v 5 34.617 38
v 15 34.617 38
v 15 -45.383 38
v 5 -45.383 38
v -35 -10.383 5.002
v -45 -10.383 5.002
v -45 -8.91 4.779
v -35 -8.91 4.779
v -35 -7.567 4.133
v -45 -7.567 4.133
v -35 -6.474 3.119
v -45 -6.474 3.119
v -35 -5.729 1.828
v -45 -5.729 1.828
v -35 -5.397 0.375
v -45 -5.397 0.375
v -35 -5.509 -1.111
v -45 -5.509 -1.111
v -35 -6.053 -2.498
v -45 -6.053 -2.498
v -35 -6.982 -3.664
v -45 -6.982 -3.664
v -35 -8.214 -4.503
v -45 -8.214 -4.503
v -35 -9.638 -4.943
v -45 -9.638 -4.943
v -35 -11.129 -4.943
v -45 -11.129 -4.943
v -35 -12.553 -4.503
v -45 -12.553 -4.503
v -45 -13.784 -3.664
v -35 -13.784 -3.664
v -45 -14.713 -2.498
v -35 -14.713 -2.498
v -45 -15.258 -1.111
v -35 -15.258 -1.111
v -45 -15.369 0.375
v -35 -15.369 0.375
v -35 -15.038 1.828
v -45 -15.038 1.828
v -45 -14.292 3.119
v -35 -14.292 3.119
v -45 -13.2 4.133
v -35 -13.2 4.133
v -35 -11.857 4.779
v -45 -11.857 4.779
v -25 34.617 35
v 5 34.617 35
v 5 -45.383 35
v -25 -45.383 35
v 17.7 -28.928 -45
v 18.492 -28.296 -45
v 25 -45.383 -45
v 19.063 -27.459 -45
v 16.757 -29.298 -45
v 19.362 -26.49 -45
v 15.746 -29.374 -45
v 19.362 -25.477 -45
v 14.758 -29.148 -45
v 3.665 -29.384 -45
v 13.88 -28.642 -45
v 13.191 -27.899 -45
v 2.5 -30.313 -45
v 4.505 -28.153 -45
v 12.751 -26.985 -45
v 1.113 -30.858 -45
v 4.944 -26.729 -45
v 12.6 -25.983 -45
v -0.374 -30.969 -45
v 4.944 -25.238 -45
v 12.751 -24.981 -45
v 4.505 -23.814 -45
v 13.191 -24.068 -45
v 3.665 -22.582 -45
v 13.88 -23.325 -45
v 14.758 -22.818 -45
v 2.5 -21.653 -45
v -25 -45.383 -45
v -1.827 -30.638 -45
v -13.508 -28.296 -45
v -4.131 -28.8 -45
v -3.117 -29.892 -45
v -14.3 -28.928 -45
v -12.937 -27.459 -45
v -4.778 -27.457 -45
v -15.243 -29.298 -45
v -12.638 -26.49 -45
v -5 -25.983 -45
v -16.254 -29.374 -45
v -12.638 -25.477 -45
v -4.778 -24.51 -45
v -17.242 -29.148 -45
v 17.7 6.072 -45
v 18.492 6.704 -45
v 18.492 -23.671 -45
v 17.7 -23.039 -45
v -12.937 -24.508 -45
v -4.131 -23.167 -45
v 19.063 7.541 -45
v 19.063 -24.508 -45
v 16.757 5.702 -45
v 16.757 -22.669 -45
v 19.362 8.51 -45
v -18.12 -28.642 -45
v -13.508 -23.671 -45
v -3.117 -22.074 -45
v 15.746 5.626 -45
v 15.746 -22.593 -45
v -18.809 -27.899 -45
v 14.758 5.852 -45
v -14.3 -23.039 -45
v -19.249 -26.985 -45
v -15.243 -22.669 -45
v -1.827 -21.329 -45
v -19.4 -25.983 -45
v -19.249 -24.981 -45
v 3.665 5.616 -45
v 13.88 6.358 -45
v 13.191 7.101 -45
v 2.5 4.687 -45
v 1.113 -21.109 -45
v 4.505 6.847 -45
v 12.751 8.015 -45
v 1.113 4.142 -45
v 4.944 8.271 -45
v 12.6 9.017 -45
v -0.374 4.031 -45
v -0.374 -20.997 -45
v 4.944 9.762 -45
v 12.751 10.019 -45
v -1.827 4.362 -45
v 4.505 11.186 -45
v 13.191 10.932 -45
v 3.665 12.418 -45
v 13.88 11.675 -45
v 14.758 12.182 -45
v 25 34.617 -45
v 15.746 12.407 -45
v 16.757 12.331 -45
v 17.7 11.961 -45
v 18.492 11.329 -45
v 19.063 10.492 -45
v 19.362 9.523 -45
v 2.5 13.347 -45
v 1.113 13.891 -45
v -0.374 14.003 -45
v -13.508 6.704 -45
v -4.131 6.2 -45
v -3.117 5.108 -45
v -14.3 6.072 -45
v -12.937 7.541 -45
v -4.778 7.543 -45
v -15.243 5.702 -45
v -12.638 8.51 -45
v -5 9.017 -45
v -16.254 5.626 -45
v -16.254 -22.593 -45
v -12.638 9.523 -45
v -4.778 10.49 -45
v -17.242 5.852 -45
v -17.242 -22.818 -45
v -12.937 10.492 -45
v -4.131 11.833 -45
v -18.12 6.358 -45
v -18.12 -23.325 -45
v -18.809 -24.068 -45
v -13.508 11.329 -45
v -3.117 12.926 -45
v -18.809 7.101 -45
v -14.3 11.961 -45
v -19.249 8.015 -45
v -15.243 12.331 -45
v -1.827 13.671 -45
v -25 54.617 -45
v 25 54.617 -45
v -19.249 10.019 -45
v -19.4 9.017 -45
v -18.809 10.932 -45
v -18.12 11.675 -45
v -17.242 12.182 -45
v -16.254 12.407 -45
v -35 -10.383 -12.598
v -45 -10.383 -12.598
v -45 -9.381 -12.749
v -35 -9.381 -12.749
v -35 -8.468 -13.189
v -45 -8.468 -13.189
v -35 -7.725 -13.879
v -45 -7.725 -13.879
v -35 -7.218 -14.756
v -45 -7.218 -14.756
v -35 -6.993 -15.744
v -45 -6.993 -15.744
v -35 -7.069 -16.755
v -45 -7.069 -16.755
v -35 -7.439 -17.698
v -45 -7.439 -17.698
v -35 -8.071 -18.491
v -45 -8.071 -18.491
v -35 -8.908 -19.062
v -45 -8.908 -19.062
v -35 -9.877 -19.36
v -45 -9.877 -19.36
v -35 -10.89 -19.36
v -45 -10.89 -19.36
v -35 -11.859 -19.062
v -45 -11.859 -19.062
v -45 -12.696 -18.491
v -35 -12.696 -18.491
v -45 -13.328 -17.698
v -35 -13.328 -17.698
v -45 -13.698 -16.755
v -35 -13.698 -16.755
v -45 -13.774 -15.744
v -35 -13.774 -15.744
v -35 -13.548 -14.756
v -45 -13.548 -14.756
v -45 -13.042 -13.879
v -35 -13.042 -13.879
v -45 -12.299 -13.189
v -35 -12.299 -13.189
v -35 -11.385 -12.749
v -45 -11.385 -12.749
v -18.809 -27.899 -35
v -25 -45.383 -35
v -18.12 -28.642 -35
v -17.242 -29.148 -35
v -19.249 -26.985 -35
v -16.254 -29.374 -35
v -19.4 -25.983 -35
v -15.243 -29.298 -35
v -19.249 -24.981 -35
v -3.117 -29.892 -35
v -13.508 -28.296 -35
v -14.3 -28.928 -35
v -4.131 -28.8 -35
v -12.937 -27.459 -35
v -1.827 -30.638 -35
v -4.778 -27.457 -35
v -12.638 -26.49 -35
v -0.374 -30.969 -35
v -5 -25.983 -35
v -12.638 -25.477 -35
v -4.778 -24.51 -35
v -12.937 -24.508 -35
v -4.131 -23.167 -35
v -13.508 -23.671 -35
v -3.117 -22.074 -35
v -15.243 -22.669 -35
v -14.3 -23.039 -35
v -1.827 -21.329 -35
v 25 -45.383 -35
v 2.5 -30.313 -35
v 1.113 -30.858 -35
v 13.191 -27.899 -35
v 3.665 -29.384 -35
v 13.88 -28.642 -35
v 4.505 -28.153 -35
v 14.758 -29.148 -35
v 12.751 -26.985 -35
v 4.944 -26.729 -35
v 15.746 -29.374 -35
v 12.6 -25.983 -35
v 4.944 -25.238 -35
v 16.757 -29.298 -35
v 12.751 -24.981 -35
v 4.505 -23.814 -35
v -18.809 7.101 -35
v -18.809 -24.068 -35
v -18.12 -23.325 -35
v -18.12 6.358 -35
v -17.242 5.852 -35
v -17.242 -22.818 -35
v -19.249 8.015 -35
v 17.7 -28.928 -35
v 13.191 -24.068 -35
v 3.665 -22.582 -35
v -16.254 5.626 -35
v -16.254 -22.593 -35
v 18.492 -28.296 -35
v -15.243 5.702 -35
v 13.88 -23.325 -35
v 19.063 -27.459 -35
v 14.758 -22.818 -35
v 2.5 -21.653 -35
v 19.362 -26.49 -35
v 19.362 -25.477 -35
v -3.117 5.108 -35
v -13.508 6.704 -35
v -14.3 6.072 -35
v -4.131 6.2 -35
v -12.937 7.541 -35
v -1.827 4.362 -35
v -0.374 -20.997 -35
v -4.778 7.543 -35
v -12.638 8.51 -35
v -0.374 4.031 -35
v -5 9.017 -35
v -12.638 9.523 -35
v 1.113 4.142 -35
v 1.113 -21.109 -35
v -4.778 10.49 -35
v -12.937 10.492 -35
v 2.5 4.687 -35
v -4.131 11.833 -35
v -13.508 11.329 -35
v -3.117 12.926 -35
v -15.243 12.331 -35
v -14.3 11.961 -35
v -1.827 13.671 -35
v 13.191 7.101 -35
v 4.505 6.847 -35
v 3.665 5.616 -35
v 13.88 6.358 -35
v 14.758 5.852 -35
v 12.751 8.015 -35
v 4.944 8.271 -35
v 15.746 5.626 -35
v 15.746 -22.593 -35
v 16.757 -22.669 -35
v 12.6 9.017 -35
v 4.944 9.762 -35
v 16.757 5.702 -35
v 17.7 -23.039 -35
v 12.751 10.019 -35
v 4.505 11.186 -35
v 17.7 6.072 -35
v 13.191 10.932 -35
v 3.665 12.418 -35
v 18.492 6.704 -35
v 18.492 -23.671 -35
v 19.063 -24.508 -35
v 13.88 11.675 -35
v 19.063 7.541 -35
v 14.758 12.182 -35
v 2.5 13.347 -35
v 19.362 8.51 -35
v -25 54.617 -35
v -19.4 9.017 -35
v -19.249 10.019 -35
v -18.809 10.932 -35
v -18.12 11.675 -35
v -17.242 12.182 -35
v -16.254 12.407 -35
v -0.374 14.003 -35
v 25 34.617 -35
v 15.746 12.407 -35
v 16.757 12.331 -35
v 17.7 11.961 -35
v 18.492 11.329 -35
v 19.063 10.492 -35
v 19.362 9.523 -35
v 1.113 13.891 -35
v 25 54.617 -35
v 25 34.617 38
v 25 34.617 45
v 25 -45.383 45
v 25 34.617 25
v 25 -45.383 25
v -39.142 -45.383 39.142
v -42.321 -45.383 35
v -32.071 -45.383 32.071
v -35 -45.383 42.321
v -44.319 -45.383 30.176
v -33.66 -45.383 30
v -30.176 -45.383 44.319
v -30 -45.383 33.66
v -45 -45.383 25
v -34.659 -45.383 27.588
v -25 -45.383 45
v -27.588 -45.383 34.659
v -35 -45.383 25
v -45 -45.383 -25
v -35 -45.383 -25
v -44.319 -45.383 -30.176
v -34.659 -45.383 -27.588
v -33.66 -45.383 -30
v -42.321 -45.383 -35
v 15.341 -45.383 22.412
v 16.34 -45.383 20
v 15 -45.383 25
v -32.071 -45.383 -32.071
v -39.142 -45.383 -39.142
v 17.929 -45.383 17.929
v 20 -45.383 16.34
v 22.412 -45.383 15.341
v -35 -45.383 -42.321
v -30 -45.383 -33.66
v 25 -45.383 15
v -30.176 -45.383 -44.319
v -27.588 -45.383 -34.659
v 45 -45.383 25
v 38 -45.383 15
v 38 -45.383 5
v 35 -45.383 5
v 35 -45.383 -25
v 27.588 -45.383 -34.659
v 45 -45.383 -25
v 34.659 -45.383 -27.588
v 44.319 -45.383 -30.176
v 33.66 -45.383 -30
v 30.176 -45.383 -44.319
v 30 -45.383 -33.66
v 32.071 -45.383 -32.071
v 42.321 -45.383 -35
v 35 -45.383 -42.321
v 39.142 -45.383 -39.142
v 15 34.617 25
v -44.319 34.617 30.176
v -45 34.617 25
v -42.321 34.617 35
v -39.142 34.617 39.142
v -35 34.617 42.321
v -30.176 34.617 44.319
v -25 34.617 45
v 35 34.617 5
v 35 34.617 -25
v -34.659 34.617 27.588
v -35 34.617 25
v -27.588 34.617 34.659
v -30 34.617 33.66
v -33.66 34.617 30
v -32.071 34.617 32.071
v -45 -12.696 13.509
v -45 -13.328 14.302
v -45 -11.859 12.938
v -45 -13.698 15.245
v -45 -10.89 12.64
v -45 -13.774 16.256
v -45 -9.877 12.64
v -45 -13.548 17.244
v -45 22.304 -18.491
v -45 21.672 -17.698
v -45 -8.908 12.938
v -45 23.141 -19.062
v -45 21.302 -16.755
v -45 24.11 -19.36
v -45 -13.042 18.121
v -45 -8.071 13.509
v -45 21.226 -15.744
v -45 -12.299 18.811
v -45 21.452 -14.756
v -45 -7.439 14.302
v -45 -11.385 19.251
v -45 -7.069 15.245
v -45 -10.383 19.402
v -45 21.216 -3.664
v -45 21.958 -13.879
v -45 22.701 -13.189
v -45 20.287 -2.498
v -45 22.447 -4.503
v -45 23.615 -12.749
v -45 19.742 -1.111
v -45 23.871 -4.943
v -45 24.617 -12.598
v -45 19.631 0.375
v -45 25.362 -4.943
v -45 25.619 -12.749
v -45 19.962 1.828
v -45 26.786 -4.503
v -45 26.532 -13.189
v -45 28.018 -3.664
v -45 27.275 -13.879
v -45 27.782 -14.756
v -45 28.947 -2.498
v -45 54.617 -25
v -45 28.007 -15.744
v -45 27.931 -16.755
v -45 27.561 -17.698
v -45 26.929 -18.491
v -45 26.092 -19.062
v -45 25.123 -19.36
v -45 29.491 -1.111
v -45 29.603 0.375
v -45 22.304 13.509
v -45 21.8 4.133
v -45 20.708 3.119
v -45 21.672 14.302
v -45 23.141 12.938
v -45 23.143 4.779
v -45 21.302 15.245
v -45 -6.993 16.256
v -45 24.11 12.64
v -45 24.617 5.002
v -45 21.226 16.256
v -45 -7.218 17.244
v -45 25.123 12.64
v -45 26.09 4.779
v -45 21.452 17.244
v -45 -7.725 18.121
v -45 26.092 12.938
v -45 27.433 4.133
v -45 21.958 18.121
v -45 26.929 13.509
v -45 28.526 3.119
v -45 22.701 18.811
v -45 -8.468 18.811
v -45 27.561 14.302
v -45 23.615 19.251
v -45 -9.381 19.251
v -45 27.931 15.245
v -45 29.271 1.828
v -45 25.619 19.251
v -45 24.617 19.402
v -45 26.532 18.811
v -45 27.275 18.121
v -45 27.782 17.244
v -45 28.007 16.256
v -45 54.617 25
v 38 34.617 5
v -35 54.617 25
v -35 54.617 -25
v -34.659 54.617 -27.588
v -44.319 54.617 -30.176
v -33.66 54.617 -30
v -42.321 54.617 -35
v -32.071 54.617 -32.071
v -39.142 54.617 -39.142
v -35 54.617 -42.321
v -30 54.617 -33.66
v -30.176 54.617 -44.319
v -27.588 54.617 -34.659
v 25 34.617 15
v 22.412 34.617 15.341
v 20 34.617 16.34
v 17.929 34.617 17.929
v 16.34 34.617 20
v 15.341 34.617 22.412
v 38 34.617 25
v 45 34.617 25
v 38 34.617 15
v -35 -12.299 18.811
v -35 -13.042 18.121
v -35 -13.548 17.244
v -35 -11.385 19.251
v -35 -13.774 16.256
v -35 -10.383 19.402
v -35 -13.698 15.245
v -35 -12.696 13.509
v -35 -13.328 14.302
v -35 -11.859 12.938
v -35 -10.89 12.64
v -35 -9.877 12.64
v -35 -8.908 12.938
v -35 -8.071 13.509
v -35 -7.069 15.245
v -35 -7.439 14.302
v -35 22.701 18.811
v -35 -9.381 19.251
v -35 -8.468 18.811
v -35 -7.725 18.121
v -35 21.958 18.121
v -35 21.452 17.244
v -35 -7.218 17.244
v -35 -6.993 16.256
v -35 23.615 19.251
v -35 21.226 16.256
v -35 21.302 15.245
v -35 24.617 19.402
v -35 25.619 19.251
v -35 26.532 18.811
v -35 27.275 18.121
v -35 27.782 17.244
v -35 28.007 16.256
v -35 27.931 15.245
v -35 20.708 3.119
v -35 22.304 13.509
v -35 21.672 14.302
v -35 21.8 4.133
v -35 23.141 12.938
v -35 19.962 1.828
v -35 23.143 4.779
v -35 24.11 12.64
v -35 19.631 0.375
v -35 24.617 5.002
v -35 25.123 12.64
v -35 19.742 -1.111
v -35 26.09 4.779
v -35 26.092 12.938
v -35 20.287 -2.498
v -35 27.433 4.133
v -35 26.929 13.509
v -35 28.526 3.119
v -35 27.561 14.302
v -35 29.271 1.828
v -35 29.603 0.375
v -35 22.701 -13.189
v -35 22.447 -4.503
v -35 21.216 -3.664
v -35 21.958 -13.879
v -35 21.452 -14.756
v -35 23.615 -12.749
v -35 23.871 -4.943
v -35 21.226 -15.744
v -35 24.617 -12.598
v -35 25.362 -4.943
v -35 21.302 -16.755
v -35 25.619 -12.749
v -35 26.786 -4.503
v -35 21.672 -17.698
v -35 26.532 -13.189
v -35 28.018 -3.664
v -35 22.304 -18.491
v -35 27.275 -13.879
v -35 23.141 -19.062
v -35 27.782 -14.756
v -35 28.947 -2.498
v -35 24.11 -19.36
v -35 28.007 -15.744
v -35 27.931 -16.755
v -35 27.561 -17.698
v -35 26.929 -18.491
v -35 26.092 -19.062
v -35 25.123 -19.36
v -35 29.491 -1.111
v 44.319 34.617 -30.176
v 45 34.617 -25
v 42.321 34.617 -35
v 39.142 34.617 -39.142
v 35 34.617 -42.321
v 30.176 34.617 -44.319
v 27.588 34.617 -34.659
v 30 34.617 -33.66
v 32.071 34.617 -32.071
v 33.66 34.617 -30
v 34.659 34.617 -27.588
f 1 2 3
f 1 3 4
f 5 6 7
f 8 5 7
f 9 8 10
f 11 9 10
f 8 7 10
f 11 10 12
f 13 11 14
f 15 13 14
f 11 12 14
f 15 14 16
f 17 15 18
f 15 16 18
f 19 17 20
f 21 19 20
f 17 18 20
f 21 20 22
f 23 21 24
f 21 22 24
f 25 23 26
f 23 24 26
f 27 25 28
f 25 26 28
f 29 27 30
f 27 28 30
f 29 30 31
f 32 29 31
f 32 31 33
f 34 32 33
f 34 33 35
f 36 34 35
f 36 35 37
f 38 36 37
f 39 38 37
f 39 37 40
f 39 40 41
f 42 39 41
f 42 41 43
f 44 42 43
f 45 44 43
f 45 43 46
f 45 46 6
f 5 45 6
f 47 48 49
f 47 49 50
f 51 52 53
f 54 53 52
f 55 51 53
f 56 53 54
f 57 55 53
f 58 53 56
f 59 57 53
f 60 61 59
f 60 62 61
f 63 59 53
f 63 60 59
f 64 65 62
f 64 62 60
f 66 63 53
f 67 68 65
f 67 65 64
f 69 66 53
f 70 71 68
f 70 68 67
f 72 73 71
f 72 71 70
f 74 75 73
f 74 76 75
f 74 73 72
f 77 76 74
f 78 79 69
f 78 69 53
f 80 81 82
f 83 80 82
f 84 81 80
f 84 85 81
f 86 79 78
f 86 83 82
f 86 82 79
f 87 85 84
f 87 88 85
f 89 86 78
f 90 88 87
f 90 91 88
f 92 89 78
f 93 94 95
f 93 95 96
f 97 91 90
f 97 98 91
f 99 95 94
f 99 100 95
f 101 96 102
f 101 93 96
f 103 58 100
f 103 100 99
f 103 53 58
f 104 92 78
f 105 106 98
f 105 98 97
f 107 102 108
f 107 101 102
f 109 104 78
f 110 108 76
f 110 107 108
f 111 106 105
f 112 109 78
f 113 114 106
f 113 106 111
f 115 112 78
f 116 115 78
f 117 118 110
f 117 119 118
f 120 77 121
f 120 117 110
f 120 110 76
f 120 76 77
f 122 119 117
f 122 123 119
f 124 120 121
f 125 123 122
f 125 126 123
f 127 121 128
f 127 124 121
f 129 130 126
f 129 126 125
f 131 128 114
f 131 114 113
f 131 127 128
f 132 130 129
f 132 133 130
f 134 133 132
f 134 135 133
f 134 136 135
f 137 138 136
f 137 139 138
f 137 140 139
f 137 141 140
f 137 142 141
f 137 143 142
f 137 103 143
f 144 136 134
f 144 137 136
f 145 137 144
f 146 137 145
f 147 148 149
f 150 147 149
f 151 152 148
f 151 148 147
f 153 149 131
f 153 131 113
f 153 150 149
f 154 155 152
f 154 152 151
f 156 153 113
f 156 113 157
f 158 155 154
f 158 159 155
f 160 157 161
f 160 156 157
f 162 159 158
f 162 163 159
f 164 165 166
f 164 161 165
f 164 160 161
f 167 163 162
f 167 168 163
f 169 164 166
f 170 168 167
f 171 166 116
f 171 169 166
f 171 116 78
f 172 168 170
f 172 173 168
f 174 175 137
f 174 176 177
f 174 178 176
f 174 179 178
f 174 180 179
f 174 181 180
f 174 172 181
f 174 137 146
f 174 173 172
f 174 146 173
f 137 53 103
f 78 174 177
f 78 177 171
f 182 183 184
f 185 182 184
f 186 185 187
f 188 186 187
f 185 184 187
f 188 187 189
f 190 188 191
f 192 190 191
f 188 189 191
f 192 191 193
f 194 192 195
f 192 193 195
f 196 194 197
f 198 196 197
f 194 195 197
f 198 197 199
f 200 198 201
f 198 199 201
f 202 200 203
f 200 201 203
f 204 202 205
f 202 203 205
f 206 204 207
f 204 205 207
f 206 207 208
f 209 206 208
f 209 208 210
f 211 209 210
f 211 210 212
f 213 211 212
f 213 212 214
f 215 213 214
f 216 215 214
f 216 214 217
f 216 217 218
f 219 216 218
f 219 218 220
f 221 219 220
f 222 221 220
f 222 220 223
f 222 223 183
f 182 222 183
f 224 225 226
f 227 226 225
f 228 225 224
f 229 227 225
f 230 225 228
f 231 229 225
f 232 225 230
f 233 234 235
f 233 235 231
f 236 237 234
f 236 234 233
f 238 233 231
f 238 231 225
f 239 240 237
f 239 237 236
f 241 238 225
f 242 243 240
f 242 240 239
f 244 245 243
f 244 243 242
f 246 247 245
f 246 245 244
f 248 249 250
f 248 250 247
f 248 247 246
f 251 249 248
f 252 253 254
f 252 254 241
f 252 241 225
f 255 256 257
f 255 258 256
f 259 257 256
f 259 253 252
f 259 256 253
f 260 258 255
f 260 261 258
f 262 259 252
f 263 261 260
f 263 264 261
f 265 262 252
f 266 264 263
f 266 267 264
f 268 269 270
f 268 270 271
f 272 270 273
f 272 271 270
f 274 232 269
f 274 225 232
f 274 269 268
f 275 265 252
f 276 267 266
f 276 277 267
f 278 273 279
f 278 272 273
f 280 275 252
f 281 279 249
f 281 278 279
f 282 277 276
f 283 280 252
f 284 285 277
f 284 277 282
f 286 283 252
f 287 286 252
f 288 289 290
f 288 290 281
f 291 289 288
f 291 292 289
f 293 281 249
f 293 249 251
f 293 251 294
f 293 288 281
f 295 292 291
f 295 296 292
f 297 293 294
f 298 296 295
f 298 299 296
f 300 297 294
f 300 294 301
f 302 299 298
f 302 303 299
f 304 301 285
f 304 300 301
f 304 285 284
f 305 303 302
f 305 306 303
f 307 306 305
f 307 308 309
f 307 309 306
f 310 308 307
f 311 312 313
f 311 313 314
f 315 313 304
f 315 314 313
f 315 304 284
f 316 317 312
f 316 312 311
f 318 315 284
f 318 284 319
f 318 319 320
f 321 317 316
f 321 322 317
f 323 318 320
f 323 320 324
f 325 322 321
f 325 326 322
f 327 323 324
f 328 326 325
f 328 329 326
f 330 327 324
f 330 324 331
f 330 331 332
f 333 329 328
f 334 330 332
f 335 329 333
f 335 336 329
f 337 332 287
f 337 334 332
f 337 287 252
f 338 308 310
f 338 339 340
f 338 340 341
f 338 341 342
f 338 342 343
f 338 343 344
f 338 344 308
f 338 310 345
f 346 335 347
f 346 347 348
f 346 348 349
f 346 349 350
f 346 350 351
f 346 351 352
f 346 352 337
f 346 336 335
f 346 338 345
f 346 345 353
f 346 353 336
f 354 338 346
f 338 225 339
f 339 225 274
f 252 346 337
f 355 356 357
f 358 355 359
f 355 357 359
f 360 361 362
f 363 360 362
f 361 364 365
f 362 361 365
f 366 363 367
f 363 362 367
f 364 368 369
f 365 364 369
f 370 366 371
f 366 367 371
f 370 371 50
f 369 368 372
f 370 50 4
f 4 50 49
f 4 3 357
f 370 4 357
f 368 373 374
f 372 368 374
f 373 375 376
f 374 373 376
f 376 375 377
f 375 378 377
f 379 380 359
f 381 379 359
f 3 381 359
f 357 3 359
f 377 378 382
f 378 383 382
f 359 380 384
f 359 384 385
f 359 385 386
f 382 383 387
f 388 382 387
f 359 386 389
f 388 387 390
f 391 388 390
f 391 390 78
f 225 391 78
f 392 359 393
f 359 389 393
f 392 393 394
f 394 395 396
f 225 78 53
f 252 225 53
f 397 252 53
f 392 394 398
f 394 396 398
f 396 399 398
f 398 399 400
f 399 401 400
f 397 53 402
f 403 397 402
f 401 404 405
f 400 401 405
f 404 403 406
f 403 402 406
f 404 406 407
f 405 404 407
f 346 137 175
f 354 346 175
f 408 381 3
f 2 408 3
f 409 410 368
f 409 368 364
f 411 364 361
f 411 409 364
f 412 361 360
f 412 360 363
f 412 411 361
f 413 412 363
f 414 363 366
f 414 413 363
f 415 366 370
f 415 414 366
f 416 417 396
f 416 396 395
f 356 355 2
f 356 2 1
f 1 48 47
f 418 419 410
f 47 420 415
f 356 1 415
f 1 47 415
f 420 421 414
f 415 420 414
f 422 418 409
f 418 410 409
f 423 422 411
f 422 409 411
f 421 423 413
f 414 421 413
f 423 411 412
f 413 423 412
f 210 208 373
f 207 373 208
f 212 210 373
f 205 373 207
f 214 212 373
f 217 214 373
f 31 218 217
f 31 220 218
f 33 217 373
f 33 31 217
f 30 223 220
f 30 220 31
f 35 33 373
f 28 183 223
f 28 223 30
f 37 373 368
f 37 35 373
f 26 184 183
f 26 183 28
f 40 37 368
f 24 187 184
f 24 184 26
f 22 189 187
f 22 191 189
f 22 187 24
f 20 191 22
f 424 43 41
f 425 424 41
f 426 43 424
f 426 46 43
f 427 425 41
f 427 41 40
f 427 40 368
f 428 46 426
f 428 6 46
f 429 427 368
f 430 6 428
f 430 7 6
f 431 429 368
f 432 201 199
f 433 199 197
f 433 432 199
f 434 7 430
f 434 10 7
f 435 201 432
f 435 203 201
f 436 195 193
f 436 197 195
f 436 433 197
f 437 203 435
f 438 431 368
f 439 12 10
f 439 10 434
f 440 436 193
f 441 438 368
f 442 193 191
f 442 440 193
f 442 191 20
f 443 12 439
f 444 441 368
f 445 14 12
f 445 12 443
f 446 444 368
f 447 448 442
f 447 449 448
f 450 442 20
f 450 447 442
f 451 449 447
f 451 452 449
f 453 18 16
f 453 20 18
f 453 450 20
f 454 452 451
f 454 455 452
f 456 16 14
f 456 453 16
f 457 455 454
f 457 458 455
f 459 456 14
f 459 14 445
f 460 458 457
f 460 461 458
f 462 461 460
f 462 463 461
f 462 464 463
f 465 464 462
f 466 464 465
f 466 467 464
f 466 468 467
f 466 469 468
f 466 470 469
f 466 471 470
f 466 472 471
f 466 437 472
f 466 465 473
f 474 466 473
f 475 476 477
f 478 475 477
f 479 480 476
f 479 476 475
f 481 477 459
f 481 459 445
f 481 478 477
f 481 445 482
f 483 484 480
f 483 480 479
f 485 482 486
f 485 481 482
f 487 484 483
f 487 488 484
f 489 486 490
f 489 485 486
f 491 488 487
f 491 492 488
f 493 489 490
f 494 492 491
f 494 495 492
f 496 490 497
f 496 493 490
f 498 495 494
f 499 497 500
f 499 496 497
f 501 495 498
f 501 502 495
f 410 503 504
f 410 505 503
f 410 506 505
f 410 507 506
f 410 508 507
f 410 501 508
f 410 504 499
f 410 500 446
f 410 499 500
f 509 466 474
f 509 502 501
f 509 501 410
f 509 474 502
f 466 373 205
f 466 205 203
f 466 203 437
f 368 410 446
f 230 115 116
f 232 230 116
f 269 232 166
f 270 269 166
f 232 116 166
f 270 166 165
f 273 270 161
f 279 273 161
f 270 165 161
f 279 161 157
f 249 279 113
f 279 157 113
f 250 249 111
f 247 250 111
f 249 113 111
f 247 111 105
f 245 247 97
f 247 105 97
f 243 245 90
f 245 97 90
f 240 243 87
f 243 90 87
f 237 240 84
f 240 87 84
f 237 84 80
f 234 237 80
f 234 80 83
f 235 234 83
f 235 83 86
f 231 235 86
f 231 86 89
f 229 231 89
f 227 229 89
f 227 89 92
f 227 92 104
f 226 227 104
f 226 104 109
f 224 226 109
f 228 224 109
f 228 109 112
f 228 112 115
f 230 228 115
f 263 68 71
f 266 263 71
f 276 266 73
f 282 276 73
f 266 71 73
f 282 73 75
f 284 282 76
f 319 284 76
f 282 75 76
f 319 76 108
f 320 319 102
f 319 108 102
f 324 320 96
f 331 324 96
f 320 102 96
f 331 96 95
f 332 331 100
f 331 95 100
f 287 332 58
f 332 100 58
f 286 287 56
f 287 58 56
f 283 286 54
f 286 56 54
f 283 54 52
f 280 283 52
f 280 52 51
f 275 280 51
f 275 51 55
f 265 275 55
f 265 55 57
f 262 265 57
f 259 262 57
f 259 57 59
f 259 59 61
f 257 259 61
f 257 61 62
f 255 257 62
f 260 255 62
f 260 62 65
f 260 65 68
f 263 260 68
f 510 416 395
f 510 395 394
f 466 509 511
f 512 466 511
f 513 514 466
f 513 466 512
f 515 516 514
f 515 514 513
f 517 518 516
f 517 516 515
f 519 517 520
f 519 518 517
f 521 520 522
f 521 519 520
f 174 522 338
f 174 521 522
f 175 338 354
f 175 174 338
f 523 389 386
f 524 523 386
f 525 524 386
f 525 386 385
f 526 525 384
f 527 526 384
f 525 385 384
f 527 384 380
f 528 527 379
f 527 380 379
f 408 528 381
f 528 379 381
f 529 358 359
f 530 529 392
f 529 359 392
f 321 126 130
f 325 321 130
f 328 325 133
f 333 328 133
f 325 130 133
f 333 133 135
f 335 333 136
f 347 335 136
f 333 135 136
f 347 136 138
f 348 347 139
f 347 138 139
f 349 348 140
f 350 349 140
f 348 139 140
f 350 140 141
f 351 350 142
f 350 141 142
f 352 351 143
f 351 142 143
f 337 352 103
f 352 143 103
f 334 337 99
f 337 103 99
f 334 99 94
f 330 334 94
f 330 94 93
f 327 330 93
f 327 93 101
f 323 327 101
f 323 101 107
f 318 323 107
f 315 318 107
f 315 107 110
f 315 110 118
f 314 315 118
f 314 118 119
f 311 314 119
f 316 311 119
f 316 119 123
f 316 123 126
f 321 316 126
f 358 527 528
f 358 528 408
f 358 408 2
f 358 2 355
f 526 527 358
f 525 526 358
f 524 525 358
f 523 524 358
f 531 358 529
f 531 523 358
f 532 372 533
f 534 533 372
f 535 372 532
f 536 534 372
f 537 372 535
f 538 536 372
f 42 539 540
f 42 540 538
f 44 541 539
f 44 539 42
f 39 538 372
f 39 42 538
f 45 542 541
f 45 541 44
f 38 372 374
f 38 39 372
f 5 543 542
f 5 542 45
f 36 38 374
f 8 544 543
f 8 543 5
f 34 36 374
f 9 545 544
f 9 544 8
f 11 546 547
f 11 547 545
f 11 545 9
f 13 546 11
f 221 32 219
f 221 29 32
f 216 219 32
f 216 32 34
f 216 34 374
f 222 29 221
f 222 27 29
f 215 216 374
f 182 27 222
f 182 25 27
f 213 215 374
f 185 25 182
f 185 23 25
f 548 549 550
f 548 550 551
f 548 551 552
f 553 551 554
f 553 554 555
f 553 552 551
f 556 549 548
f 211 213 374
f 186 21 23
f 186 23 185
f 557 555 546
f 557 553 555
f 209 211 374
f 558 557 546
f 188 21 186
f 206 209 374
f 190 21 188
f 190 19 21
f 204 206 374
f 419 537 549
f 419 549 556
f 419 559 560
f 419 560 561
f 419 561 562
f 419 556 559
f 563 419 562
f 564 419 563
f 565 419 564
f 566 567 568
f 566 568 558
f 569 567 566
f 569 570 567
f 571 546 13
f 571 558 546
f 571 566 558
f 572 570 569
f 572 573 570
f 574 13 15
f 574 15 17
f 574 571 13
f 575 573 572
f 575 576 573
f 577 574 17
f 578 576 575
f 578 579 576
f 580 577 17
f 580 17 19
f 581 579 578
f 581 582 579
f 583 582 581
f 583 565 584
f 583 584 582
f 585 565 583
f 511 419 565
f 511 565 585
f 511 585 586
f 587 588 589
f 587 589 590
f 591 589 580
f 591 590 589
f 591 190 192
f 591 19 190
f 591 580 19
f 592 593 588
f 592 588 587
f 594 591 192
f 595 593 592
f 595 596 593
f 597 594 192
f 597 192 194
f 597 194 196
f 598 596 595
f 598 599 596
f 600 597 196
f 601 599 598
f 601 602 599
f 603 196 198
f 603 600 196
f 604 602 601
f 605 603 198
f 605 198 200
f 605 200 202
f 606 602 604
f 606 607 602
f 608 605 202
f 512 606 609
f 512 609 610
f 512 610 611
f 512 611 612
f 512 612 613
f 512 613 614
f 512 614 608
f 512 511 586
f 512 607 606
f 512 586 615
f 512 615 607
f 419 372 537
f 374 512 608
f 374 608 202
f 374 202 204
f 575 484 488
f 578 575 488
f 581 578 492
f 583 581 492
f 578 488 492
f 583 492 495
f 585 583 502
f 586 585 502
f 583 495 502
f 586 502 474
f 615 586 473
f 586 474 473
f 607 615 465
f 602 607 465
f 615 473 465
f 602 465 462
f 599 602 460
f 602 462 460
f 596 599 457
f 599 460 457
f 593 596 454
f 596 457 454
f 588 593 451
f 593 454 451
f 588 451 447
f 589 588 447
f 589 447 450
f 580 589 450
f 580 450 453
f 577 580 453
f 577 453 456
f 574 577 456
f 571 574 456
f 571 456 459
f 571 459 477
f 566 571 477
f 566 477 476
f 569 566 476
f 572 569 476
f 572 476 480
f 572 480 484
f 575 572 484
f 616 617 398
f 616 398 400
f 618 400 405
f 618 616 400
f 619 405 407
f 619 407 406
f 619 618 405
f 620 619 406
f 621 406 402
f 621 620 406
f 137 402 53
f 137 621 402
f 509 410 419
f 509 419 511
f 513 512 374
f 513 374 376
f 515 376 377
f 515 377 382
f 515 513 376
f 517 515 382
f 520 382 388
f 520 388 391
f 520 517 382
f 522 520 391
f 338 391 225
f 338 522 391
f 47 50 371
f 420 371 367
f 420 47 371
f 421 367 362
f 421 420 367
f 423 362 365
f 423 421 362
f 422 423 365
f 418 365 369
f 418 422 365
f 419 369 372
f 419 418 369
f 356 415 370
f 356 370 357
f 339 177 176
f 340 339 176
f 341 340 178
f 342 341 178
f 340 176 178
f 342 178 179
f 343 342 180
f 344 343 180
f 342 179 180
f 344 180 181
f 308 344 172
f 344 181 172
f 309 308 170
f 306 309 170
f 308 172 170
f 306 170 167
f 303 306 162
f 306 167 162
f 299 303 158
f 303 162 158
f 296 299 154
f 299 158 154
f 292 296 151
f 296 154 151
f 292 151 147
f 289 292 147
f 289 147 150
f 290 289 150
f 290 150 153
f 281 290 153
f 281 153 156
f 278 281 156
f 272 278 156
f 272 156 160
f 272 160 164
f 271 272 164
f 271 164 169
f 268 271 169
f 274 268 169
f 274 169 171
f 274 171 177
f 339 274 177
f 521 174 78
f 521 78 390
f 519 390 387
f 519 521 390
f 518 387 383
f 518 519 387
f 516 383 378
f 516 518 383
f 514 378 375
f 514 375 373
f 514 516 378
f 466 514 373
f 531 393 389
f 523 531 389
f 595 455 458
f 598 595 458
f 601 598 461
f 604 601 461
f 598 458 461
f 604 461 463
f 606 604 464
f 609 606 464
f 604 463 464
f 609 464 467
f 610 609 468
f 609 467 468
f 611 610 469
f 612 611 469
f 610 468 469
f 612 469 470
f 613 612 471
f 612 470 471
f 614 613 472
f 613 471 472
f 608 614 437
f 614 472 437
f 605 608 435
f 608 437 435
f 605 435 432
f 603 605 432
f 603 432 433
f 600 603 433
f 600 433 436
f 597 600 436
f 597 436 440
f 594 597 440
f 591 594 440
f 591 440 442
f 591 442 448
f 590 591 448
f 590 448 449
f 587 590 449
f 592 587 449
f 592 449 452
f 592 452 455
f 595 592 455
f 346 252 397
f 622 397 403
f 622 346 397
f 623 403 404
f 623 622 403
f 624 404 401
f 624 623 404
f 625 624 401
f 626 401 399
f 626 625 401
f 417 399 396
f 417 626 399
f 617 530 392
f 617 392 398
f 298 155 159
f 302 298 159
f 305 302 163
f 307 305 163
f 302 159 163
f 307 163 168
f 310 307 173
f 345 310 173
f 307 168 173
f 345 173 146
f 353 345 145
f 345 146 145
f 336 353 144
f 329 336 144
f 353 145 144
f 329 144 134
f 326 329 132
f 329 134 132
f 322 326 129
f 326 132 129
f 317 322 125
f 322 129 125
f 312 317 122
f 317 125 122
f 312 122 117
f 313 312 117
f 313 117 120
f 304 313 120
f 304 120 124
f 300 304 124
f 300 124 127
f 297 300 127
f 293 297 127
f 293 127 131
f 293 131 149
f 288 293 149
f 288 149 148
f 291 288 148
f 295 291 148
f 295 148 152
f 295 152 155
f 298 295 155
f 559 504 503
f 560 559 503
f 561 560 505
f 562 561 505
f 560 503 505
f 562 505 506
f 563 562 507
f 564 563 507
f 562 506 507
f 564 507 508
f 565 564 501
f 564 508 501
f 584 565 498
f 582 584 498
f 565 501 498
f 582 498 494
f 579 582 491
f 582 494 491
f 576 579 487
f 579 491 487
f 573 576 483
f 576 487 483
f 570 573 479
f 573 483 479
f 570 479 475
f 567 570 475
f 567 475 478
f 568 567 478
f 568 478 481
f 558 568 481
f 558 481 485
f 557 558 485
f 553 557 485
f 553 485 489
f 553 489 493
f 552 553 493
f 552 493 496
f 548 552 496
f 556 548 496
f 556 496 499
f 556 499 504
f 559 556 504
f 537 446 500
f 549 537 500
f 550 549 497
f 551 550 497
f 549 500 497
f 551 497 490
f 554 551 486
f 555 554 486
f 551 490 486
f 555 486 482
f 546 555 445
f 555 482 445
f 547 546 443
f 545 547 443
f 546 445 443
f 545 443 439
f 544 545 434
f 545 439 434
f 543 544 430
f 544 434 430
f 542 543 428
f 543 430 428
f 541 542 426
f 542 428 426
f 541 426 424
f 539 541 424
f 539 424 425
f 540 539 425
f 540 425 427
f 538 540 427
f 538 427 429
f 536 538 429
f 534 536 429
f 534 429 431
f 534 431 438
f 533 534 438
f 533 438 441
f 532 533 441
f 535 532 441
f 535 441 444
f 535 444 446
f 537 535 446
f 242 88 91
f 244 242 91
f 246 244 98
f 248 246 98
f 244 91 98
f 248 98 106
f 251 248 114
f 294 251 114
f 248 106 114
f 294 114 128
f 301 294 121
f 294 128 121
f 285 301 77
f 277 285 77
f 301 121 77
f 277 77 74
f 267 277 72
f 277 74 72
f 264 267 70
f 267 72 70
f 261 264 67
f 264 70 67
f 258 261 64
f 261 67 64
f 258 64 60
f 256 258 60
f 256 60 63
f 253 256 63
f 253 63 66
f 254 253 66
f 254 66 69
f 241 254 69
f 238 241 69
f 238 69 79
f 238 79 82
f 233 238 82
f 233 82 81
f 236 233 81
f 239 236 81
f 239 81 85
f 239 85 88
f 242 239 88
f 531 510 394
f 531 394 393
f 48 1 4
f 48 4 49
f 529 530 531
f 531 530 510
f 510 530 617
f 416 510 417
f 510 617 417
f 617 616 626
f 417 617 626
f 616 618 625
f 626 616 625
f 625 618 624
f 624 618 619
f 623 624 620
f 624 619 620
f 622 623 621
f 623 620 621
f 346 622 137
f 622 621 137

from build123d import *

# Parameters (mm, degrees)
BOSS_EXTRUDE1_DEPTH      = 54.6167
BOSS_EXTRUDE1_DEPTH_BACK = 45.3833
SKETCH2_W                = 20
SKETCH2_H                = 20
CUT_EXTRUDE1_DEPTH       = 91
SKETCH3_W                = 20
SKETCH3_H                = 20
CUT_EXTRUDE2_DEPTH       = 91
BOSS_EXTRUDE2_START      = -45.3833
SKETCH1_5_W              = 3
SKETCH1_5_H              = 10
SKETCH1_5_W_2            = 10
SKETCH1_5_H_2            = 3
BOSS_EXTRUDE2_DEPTH      = 80
CUT_EXTRUDE3_REACH       = 92
SKETCH5_R                = 5
SKETCH5_R_2              = 3.4
CUT_EXTRUDE4_REACH       = 92
SKETCH4_R                = 5
SKETCH4_R_2              = 3.4


with BuildPart() as part:
    # Sketch1 → Boss-Extrude1 (new body, two sides)
    with BuildSketch(Plane(origin=(0, 0, 0), x_dir=(1, 0, 0), z_dir=(0, 1, 0))) as boss_extrude1_sk:
        with BuildLine():
            ThreePointArc((45, 25), (39.142135624, 39.142135624), (25, 45))
            Line((25, 45), (-25, 45))
            ThreePointArc((-25, 45), (-39.142135624, 39.142135624), (-45, 25))
            Line((-45, 25), (-45, -25))
            ThreePointArc((-45, -25), (-39.142135624, -39.142135624), (-25, -45))
            Line((-25, -45), (25, -45))
            Line((25, -45), (25, -38))
            Line((25, -38), (15, -38))
            Line((15, -38), (5, -38))
            Line((5, -38), (5, -35))
            Line((5, -35), (-25, -35))
            ThreePointArc((-25, -35), (-32.071067812, -32.071067812), (-35, -25))
            Line((-35, -25), (-35, 25))
            ThreePointArc((-35, 25), (-32.071067812, 32.071067812), (-25, 35))
            Line((-25, 35), (25, 35))
            ThreePointArc((25, 35), (32.071067812, 32.071067812), (35, 25))
            Line((35, 25), (35, -5))
            Line((35, -5), (38, -5))
            Line((38, -5), (38, -15))
            Line((38, -15), (38, -25))
            Line((38, -25), (45, -25))
            Line((45, -25), (45, 25))
        make_face()
    extrude(amount=BOSS_EXTRUDE1_DEPTH)
    extrude(boss_extrude1_sk.sketch, amount=-BOSS_EXTRUDE1_DEPTH_BACK)

    # Sketch2 → Cut-Extrude1 (cut, through all)
    with BuildSketch(Plane(origin=(0, 0, -45), x_dir=(-1, 0, 0), z_dir=(0, 0, -1))):
        with Locations((-35, 44.616700276)):
            Rectangle(SKETCH2_W, SKETCH2_H)
    extrude(amount=-CUT_EXTRUDE1_DEPTH, mode=Mode.SUBTRACT)

    # Sketch3 → Cut-Extrude2 (cut, through all)
    with BuildSketch(Plane.ZY.offset(45)):
        with Locations((35, 44.616700276)):
            Rectangle(SKETCH3_W, SKETCH3_H)
    extrude(amount=-CUT_EXTRUDE2_DEPTH, mode=Mode.SUBTRACT)

    # Sketch1<5> → Boss-Extrude2 (add)
    with BuildSketch(Plane(origin=(0, 0, 0), x_dir=(1, 0, 0), z_dir=(0, 1, 0)).offset(BOSS_EXTRUDE2_START)):
        with BuildLine():
            Line((25, -25), (35, -25))
            Line((35, -25), (35, -15))
            Line((35, -15), (25, -15))
            ThreePointArc((25, -15), (17.928932188, -17.928932188), (15, -25))
            Line((15, -25), (15, -35))
            Line((15, -35), (25, -35))
            Line((25, -35), (25, -25))
        make_face()
        with Locations((36.5, -20)):
            Rectangle(SKETCH1_5_W, SKETCH1_5_H)
        with Locations((20, -36.5)):
            Rectangle(SKETCH1_5_W_2, SKETCH1_5_H_2)
    extrude(amount=BOSS_EXTRUDE2_DEPTH)

    # Sketch5 → Cut-Extrude3 (cut, up to next)
    with BuildSketch(Plane(origin=(0, 0, -45), x_dir=(-1, 0, 0), z_dir=(0, 0, -1)), mode=Mode.PRIVATE) as cut_extrude3_sk1:
        with Locations((0, 9.016700277)):
            Circle(SKETCH5_R)
    cut_extrude3_tool1 = extrude(cut_extrude3_sk1.sketch, amount=-CUT_EXTRUDE3_REACH, mode=Mode.PRIVATE) & part.part
    add(cut_extrude3_tool1.solids().sort_by_distance((0, 9.0167, -45))[0], mode=Mode.SUBTRACT)
    # Sketch5 → Cut-Extrude3 (cut, up to next)
    with BuildSketch(Plane(origin=(0, 0, -45), x_dir=(-1, 0, 0), z_dir=(0, 0, -1)), mode=Mode.PRIVATE) as cut_extrude3_sk2:
        with Locations((0, -25.983299723)):
            Circle(SKETCH5_R)
    cut_extrude3_tool2 = extrude(cut_extrude3_sk2.sketch, amount=-CUT_EXTRUDE3_REACH, mode=Mode.PRIVATE) & part.part
    add(cut_extrude3_tool2.solids().sort_by_distance((0, -25.9833, -45))[0], mode=Mode.SUBTRACT)
    # Sketch5 → Cut-Extrude3 (cut, up to next)
    with BuildSketch(Plane(origin=(0, 0, -45), x_dir=(-1, 0, 0), z_dir=(0, 0, -1)), mode=Mode.PRIVATE) as cut_extrude3_sk3:
        with Locations((16, -25.983299723)):
            Circle(SKETCH5_R_2)
    cut_extrude3_tool3 = extrude(cut_extrude3_sk3.sketch, amount=-CUT_EXTRUDE3_REACH, mode=Mode.PRIVATE) & part.part
    add(cut_extrude3_tool3.solids().sort_by_distance((-16, -25.9833, -45))[0], mode=Mode.SUBTRACT)
    # Sketch5 → Cut-Extrude3 (cut, up to next)
    with BuildSketch(Plane(origin=(0, 0, -45), x_dir=(-1, 0, 0), z_dir=(0, 0, -1)), mode=Mode.PRIVATE) as cut_extrude3_sk4:
        with Locations((-16, -25.983299723)):
            Circle(SKETCH5_R_2)
    cut_extrude3_tool4 = extrude(cut_extrude3_sk4.sketch, amount=-CUT_EXTRUDE3_REACH, mode=Mode.PRIVATE) & part.part
    add(cut_extrude3_tool4.solids().sort_by_distance((16, -25.9833, -45))[0], mode=Mode.SUBTRACT)
    # Sketch5 → Cut-Extrude3 (cut, up to next)
    with BuildSketch(Plane(origin=(0, 0, -45), x_dir=(-1, 0, 0), z_dir=(0, 0, -1)), mode=Mode.PRIVATE) as cut_extrude3_sk5:
        with Locations((-16, 9.016700277)):
            Circle(SKETCH5_R_2)
    cut_extrude3_tool5 = extrude(cut_extrude3_sk5.sketch, amount=-CUT_EXTRUDE3_REACH, mode=Mode.PRIVATE) & part.part
    add(cut_extrude3_tool5.solids().sort_by_distance((16, 9.0167, -45))[0], mode=Mode.SUBTRACT)
    # Sketch5 → Cut-Extrude3 (cut, up to next)
    with BuildSketch(Plane(origin=(0, 0, -45), x_dir=(-1, 0, 0), z_dir=(0, 0, -1)), mode=Mode.PRIVATE) as cut_extrude3_sk6:
        with Locations((16, 9.016700277)):
            Circle(SKETCH5_R_2)
    cut_extrude3_tool6 = extrude(cut_extrude3_sk6.sketch, amount=-CUT_EXTRUDE3_REACH, mode=Mode.PRIVATE) & part.part
    add(cut_extrude3_tool6.solids().sort_by_distance((-16, 9.0167, -45))[0], mode=Mode.SUBTRACT)

    # Sketch4 → Cut-Extrude4 (cut, up to next)
    with BuildSketch(Plane.ZY.offset(45), mode=Mode.PRIVATE) as cut_extrude4_sk1:
        with Locations((0.001556396, 24.616700277)):
            Circle(SKETCH4_R)
    cut_extrude4_tool1 = extrude(cut_extrude4_sk1.sketch, amount=-CUT_EXTRUDE4_REACH, mode=Mode.PRIVATE) & part.part
    add(cut_extrude4_tool1.solids().sort_by_distance((-45, 24.6167, 0.001556))[0], mode=Mode.SUBTRACT)
    # Sketch4 → Cut-Extrude4 (cut, up to next)
    with BuildSketch(Plane.ZY.offset(45), mode=Mode.PRIVATE) as cut_extrude4_sk2:
        with Locations((0.001556396, -10.383299723)):
            Circle(SKETCH4_R)
    cut_extrude4_tool2 = extrude(cut_extrude4_sk2.sketch, amount=-CUT_EXTRUDE4_REACH, mode=Mode.PRIVATE) & part.part
    add(cut_extrude4_tool2.solids().sort_by_distance((-45, -10.3833, 0.001556))[0], mode=Mode.SUBTRACT)
    # Sketch4 → Cut-Extrude4 (cut, up to next)
    with BuildSketch(Plane.ZY.offset(45), mode=Mode.PRIVATE) as cut_extrude4_sk3:
        with Locations((16.001556396, -10.383299723)):
            Circle(SKETCH4_R_2)
    cut_extrude4_tool3 = extrude(cut_extrude4_sk3.sketch, amount=-CUT_EXTRUDE4_REACH, mode=Mode.PRIVATE) & part.part
    add(cut_extrude4_tool3.solids().sort_by_distance((-45, -10.3833, 16.001556))[0], mode=Mode.SUBTRACT)
    # Sketch4 → Cut-Extrude4 (cut, up to next)
    with BuildSketch(Plane.ZY.offset(45), mode=Mode.PRIVATE) as cut_extrude4_sk4:
        with Locations((-15.998443604, -10.383299723)):
            Circle(SKETCH4_R_2)
    cut_extrude4_tool4 = extrude(cut_extrude4_sk4.sketch, amount=-CUT_EXTRUDE4_REACH, mode=Mode.PRIVATE) & part.part
    add(cut_extrude4_tool4.solids().sort_by_distance((-45, -10.3833, -15.998444))[0], mode=Mode.SUBTRACT)
    # Sketch4 → Cut-Extrude4 (cut, up to next)
    with BuildSketch(Plane.ZY.offset(45), mode=Mode.PRIVATE) as cut_extrude4_sk5:
        with Locations((16.001556396, 24.616700277)):
            Circle(SKETCH4_R_2)
    cut_extrude4_tool5 = extrude(cut_extrude4_sk5.sketch, amount=-CUT_EXTRUDE4_REACH, mode=Mode.PRIVATE) & part.part
    add(cut_extrude4_tool5.solids().sort_by_distance((-45, 24.6167, 16.001556))[0], mode=Mode.SUBTRACT)
    # Sketch4 → Cut-Extrude4 (cut, up to next)
    with BuildSketch(Plane.ZY.offset(45), mode=Mode.PRIVATE) as cut_extrude4_sk6:
        with Locations((-15.998443604, 24.616700277)):
            Circle(SKETCH4_R_2)
    cut_extrude4_tool6 = extrude(cut_extrude4_sk6.sketch, amount=-CUT_EXTRUDE4_REACH, mode=Mode.PRIVATE) & part.part
    add(cut_extrude4_tool6.solids().sort_by_distance((-45, 24.6167, -15.998444))[0], mode=Mode.SUBTRACT)


solid = part.part
